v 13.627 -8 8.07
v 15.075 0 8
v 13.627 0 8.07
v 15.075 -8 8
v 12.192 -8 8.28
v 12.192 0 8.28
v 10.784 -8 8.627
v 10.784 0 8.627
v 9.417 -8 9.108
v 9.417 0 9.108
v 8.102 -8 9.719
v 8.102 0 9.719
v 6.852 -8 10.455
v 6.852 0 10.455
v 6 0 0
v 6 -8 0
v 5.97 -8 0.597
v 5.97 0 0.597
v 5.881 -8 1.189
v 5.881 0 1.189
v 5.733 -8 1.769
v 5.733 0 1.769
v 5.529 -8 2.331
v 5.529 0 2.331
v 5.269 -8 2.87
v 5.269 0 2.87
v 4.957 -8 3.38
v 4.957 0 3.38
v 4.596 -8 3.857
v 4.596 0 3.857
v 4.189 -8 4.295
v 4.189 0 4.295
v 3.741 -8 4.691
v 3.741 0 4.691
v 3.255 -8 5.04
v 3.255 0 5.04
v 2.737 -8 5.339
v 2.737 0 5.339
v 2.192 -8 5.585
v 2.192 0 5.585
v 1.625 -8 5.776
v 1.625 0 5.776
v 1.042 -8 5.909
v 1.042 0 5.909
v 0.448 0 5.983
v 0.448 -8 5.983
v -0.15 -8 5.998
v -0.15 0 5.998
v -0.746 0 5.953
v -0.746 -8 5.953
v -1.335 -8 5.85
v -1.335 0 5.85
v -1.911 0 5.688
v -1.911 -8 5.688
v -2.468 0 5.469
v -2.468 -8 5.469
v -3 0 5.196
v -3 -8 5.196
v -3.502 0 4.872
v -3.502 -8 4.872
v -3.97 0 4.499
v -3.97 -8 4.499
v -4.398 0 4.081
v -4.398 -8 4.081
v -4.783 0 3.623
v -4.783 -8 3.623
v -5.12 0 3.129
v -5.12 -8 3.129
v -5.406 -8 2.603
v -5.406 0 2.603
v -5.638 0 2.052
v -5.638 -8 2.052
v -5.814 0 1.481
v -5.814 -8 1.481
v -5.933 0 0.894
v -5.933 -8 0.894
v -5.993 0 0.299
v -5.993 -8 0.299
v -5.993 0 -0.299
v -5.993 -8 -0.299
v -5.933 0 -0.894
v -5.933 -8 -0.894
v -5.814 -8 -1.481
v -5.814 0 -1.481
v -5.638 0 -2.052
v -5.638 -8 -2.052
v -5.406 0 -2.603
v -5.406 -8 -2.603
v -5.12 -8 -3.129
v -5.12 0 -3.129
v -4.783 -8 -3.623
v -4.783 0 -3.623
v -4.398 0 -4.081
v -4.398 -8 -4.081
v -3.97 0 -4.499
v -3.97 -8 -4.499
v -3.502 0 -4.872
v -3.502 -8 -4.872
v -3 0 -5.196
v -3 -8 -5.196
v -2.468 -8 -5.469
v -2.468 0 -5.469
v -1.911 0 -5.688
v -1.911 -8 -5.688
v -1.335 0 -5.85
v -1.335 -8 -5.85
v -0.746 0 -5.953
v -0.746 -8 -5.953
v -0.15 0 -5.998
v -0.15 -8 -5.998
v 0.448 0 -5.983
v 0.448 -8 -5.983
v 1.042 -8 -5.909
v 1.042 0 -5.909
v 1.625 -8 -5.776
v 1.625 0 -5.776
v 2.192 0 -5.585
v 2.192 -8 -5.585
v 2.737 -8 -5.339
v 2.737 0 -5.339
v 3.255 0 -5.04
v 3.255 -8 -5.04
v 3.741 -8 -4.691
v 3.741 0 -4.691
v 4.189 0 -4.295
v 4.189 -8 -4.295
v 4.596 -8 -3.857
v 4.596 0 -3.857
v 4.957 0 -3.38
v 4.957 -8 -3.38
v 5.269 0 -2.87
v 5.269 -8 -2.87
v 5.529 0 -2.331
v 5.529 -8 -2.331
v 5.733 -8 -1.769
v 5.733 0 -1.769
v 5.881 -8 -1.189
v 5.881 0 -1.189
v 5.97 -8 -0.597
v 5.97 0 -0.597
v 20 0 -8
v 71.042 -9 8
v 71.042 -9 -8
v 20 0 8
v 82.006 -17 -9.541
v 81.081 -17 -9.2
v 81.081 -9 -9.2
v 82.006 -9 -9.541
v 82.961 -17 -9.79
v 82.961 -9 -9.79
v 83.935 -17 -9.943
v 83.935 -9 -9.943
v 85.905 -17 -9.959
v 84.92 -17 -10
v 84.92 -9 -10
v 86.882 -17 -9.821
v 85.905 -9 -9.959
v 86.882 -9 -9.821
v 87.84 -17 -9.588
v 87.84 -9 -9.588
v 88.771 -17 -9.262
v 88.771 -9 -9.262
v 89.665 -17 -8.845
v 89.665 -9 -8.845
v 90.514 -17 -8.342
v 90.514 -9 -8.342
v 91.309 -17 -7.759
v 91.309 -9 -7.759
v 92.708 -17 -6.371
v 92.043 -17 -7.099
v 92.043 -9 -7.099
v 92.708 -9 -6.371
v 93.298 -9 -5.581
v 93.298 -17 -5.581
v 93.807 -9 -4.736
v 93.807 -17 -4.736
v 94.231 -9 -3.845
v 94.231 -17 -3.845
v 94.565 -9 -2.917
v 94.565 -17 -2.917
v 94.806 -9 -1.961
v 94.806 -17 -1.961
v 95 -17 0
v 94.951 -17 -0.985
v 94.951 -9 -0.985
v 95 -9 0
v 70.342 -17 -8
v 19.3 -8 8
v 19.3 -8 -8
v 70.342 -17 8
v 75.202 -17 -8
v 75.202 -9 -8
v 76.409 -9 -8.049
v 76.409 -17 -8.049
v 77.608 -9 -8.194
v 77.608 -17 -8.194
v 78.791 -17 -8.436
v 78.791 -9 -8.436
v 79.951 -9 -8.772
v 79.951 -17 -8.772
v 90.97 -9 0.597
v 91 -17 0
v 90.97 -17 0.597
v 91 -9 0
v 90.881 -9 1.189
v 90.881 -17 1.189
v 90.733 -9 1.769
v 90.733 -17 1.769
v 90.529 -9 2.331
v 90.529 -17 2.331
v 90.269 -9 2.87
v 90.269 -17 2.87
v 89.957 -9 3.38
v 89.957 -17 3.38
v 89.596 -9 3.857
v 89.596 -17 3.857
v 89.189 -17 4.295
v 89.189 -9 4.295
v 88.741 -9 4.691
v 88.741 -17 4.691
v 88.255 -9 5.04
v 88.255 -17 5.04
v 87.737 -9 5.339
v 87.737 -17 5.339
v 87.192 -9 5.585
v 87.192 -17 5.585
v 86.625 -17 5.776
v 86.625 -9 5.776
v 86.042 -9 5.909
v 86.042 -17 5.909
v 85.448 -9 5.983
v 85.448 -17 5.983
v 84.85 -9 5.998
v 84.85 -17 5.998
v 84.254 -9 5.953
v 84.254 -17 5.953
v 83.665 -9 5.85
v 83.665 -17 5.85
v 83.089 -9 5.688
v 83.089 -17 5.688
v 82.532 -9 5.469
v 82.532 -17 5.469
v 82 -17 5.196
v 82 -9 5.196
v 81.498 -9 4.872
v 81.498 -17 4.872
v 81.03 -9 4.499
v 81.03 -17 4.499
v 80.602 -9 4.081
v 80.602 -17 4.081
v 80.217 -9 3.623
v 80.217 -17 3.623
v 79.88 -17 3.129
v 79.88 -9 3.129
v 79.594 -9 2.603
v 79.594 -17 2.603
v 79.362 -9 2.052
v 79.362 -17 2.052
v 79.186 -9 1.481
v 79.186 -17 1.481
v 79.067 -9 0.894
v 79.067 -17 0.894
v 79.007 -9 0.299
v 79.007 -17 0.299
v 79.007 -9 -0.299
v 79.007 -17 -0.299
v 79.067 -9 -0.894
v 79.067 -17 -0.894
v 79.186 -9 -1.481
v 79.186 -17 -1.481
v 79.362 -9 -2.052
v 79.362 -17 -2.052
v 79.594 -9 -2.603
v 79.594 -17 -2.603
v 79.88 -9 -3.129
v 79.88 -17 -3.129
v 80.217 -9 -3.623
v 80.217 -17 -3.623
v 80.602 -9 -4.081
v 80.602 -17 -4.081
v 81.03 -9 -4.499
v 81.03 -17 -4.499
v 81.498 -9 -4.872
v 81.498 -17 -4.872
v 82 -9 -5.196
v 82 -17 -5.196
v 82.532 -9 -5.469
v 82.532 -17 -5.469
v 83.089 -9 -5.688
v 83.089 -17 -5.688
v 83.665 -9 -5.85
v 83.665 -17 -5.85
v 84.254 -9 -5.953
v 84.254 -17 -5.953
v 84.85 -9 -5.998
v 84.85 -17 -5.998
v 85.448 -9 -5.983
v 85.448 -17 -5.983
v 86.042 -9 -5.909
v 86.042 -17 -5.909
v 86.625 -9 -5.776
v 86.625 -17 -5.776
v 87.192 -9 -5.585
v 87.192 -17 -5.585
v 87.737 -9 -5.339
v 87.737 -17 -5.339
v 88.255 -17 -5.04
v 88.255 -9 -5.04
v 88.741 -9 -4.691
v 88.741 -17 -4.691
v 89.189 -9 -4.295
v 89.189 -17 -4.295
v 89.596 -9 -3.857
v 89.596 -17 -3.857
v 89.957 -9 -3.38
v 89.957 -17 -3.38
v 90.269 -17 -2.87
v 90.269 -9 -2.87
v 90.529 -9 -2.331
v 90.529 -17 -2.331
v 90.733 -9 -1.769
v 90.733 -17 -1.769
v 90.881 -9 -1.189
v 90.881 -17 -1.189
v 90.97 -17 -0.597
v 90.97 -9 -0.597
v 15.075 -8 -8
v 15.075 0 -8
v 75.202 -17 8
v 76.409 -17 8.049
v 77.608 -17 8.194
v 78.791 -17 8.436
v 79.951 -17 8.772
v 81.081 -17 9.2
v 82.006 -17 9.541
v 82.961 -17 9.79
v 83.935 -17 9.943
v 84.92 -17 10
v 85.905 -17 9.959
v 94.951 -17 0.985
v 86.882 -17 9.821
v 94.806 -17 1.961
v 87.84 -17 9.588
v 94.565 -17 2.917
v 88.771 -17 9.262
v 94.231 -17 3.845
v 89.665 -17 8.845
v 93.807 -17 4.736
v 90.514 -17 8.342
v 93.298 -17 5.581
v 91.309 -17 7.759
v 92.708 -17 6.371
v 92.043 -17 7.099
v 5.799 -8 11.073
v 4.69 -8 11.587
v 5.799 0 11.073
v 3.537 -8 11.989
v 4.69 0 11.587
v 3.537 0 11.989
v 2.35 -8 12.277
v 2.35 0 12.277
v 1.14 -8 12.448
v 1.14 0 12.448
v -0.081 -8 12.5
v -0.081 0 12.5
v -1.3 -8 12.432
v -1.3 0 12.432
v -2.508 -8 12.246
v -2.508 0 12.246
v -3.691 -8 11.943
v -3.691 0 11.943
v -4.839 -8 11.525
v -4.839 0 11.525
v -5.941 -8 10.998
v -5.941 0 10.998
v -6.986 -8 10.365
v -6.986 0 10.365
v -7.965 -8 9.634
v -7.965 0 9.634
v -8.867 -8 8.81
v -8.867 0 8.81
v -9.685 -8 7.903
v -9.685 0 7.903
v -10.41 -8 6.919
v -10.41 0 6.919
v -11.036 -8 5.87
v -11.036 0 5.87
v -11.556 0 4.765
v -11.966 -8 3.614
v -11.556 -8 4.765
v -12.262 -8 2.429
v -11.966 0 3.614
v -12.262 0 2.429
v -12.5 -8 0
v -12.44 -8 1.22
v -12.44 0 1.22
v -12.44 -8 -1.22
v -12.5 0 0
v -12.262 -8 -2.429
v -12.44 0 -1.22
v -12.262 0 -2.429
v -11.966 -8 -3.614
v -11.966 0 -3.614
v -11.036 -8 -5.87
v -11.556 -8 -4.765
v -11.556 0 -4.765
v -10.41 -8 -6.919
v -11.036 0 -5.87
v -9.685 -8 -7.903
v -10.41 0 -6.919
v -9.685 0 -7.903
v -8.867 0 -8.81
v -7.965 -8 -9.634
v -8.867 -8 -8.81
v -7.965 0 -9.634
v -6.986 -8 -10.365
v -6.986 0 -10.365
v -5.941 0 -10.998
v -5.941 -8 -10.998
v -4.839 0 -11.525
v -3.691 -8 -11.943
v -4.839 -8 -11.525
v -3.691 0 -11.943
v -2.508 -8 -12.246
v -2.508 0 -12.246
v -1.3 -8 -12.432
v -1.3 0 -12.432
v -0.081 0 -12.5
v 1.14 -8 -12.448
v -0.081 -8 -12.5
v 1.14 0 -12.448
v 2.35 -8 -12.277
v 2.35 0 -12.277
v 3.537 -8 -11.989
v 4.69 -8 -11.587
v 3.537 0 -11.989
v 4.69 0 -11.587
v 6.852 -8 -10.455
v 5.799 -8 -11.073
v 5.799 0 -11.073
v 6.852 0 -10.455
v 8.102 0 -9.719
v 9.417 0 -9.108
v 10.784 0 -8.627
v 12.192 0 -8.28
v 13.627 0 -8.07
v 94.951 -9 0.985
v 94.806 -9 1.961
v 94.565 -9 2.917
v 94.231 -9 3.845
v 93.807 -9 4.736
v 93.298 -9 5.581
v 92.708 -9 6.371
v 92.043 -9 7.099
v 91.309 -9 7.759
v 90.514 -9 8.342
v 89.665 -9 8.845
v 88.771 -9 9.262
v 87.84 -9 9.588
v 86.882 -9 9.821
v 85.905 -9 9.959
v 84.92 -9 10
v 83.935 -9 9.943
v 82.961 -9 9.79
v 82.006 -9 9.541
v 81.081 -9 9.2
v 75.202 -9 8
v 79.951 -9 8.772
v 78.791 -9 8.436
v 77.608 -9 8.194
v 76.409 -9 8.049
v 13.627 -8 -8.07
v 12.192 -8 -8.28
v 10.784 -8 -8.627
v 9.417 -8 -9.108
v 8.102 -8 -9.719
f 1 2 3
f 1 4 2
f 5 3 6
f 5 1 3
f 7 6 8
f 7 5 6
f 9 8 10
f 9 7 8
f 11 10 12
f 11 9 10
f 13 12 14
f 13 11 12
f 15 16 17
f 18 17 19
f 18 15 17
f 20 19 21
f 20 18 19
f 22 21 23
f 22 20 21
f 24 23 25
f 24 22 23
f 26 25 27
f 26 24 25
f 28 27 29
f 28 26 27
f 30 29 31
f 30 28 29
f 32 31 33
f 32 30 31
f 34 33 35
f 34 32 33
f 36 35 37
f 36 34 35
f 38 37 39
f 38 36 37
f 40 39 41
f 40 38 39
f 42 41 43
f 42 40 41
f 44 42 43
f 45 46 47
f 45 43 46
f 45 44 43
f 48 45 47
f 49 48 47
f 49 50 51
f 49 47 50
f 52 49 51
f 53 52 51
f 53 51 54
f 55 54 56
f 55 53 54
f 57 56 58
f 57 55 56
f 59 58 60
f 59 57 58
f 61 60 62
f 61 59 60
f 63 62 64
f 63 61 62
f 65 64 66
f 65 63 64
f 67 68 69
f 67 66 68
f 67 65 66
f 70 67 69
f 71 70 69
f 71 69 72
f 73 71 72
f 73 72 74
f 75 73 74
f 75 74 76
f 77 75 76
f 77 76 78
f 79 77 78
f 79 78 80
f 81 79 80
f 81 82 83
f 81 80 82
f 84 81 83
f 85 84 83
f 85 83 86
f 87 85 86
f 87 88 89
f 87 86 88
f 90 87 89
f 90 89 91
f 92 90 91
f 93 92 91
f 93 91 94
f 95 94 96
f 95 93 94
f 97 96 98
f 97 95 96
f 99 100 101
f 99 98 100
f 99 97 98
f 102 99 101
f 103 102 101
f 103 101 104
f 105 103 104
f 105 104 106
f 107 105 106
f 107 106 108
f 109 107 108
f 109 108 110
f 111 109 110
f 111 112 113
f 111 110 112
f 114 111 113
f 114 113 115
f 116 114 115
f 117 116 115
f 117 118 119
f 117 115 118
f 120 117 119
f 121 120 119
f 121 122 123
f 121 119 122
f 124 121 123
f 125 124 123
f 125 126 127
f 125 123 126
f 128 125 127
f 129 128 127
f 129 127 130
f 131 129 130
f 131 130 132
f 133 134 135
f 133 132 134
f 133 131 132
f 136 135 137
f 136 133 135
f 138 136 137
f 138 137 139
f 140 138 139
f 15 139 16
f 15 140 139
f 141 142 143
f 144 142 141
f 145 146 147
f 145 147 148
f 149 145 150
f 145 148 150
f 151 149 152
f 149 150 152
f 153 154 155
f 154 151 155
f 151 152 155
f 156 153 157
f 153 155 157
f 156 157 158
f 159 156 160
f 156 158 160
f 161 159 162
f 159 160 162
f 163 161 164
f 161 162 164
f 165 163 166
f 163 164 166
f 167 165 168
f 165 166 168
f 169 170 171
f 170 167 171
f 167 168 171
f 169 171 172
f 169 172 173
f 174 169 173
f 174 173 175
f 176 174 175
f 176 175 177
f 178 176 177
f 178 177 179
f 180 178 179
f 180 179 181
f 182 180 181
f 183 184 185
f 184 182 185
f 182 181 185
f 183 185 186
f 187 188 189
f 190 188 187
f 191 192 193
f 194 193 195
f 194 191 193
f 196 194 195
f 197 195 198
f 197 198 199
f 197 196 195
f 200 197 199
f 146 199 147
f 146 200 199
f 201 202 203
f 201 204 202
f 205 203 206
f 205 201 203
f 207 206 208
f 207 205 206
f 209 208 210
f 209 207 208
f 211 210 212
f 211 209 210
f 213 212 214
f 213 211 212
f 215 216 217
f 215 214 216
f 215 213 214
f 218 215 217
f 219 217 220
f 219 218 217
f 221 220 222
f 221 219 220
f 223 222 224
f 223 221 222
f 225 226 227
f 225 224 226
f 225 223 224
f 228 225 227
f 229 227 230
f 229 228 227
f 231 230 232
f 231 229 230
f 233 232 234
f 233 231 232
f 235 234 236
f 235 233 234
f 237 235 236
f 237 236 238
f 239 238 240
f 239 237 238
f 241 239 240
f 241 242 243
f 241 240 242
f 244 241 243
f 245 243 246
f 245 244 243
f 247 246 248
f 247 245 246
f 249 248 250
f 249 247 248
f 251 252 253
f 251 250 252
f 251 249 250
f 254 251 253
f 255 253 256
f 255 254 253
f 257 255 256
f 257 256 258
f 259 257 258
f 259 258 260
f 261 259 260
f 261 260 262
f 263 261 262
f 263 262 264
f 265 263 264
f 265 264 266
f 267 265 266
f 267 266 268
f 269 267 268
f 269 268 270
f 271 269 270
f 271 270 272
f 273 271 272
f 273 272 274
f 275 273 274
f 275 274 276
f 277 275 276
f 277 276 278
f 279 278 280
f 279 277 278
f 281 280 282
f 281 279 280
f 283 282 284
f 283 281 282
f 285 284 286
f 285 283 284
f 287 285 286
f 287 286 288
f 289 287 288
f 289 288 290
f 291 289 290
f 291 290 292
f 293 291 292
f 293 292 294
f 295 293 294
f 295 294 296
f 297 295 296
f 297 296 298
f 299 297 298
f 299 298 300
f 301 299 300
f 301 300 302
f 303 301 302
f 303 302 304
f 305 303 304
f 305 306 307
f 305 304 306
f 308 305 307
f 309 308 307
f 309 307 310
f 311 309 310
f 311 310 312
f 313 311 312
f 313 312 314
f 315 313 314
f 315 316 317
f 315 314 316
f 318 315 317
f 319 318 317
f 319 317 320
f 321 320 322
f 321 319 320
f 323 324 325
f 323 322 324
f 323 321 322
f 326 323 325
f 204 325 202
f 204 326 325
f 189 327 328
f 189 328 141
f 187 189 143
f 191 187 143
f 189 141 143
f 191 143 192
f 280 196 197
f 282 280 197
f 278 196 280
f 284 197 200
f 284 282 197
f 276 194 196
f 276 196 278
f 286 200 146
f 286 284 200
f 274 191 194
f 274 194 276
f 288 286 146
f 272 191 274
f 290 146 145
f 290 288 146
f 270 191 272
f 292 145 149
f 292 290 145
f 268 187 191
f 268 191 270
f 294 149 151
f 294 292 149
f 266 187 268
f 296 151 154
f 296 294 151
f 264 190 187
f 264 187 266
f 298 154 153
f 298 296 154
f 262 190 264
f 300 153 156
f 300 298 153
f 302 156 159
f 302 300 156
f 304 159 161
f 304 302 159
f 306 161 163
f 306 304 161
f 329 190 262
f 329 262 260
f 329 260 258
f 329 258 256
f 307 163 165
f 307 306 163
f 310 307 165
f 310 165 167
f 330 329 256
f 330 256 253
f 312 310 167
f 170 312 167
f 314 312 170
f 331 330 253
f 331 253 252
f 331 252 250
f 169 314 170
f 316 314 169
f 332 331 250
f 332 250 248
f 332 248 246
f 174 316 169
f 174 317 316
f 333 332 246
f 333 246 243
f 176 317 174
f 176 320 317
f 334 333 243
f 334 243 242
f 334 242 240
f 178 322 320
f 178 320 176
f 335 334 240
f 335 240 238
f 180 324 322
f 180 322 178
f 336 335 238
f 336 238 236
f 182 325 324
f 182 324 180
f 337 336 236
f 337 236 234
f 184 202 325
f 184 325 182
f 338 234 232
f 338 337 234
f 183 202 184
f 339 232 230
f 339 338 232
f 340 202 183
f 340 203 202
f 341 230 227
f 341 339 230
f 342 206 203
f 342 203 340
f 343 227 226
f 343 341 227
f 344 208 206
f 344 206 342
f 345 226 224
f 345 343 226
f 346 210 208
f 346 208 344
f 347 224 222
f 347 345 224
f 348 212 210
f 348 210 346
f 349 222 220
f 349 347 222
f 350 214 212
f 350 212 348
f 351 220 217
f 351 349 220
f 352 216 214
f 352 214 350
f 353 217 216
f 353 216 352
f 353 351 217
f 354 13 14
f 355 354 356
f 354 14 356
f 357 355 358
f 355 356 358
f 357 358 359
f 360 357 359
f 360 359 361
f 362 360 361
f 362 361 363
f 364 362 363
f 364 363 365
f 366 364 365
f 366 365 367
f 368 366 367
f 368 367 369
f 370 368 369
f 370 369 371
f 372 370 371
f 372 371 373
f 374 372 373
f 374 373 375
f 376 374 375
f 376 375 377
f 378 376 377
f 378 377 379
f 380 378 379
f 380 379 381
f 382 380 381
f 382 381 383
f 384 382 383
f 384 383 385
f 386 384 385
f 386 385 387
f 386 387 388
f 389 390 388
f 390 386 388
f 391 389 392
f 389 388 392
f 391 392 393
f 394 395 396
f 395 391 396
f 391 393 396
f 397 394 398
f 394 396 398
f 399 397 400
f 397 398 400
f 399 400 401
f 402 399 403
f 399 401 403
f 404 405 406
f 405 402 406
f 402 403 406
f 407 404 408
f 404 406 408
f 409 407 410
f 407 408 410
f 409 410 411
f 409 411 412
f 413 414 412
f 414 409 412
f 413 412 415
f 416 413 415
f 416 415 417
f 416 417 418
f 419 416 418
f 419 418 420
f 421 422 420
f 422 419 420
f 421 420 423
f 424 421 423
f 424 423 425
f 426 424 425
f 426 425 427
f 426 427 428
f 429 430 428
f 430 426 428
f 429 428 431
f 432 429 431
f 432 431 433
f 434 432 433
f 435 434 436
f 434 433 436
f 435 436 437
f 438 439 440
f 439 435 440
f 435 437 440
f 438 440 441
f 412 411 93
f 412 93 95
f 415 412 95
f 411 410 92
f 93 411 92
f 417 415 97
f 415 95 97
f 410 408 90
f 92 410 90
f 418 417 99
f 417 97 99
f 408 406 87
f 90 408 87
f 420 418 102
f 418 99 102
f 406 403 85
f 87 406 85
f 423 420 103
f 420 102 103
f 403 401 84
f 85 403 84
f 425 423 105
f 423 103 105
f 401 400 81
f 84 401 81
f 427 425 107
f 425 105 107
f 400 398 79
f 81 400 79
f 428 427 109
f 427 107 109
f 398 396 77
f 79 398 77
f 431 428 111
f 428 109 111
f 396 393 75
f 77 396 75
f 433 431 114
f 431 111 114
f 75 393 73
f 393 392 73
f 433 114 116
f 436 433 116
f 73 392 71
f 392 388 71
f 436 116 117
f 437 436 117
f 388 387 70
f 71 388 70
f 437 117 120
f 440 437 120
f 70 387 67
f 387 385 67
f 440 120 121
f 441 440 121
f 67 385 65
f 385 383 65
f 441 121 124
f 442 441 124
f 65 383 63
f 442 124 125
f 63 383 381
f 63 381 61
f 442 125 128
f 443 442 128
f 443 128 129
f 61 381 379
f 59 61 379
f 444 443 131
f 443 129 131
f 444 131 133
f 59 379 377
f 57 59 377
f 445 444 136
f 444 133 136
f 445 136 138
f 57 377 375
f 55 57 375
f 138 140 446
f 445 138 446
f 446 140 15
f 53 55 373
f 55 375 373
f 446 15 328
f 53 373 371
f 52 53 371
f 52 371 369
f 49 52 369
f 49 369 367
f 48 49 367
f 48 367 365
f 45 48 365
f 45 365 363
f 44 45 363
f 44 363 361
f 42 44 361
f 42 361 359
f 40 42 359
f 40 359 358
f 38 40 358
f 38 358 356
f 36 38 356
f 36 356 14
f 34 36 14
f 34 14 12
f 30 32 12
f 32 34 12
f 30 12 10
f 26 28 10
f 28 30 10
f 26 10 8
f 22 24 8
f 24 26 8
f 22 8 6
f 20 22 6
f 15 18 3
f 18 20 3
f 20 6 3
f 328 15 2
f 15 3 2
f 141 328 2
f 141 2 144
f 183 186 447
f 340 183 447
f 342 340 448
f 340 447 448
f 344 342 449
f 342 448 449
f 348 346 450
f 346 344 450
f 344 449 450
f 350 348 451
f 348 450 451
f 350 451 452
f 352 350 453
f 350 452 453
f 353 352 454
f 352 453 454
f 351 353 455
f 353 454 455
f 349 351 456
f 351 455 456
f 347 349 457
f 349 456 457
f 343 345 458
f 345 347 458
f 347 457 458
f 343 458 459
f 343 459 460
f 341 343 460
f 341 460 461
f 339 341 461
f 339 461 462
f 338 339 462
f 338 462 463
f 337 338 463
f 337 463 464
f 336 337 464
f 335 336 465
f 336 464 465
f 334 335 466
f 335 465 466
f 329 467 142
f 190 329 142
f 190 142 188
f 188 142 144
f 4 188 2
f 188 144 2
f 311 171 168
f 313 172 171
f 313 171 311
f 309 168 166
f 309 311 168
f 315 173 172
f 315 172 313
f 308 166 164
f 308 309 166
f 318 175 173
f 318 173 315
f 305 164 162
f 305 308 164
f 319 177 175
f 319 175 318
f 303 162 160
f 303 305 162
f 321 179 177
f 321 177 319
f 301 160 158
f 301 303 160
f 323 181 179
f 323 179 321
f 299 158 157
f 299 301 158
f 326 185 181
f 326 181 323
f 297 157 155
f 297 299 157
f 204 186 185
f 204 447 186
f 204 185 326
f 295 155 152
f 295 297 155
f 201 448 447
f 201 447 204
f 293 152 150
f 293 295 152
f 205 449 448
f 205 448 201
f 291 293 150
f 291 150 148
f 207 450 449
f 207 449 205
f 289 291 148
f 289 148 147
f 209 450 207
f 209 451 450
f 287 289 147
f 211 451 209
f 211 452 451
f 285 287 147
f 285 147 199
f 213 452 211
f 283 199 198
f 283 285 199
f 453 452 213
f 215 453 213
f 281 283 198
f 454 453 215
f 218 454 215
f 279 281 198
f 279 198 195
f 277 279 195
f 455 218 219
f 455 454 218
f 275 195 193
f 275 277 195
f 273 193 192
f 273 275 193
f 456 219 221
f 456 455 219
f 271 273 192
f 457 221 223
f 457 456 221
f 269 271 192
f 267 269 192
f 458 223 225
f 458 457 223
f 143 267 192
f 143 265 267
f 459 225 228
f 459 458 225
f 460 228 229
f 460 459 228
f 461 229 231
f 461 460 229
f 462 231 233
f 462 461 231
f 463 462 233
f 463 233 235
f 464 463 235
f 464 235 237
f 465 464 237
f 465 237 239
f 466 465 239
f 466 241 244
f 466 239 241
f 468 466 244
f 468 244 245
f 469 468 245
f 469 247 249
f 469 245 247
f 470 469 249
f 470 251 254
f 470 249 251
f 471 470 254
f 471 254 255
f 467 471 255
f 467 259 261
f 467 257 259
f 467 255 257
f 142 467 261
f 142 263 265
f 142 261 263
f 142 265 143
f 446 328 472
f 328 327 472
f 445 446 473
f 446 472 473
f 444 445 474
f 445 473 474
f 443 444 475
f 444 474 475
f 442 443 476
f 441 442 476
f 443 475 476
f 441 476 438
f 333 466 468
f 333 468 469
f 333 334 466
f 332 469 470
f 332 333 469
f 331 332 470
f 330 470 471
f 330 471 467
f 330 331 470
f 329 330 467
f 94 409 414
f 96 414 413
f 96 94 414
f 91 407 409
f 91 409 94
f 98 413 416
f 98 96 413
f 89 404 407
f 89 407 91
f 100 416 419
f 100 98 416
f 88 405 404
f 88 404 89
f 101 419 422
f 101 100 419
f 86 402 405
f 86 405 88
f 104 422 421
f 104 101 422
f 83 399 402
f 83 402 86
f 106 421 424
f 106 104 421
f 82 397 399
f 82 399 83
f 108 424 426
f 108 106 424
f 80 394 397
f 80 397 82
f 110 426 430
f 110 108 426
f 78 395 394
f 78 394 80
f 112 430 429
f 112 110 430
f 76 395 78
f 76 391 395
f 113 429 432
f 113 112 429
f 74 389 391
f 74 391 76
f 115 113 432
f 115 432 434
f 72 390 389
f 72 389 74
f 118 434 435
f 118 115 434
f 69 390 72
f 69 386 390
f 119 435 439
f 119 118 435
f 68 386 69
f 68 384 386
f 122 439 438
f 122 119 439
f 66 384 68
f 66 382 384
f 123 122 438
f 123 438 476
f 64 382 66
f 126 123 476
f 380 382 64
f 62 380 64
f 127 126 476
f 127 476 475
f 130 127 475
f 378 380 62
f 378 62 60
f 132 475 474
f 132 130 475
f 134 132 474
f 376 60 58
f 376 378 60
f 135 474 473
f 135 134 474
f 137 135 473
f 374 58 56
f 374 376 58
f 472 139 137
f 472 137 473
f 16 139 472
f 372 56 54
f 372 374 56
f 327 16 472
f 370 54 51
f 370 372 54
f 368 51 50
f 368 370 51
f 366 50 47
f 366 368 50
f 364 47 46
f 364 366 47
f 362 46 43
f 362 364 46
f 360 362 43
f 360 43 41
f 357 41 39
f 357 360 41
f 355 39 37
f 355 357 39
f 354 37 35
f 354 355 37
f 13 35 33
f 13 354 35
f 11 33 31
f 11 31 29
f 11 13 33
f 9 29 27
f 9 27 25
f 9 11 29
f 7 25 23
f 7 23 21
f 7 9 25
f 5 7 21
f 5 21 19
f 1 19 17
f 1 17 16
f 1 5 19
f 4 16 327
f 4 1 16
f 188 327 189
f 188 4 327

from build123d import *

# Parameters (mm, degrees)
F0_R     = 6
F1_DEPTH = 25
F3_DEPTH = 12.7
F4_R     = 15
F5_R     = 15


with BuildPart() as f1:
    # F0 (on Front) → F1 (new body)
    with BuildSketch(Plane.XZ):
        with BuildLine():
            ThreePointArc((9.604686, -8), (11.753905, -4.253905), (12.5, 0))
            ThreePointArc((12.5, 0), (11.753905, 4.253905), (9.604686, 8))
            ThreePointArc((9.604686, 8), (-12.5, 0), (9.604686, -8))
        make_face()
        Circle(F0_R, mode=Mode.SUBTRACT)
        with BuildLine():
            ThreePointArc((9.604686, 8), (11.753905, 4.253905), (12.5, 0))
            ThreePointArc((12.5, 0), (11.753905, -4.253905), (9.604686, -8))
            Line((9.604686, -8), (79, -8))
            ThreePointArc((79, -8), (75, 0), (79, 8))
            Line((79, 8), (9.604686, 8))
        make_face()
        with BuildLine():
            ThreePointArc((95, 0), (89.472136, 8.944272), (79, 8))
            ThreePointArc((79, 8), (75, 0), (79, -8))
            ThreePointArc((79, -8), (89.472136, -8.944272), (95, 0))
        make_face()
        with Locations((85, 0)):
            Circle(F0_R, mode=Mode.SUBTRACT)
    extrude(amount=F1_DEPTH)

    # F2 (on Top) → F3 (intersect, symmetric)
    with BuildSketch(Plane.XY):
        Polygon((20, 0), (0, 0), (-12.5, 0), (-12.5, -8), (0, -8), (19.300091, -8), (70.341627, -17), (95, -17), (95, -9), (71.041536, -9), align=None)
    extrude(amount=F3_DEPTH, both=True, mode=Mode.INTERSECT)

    # F4
    f4_edges = [f1.edges().sort_by_distance(p)[0] for p in [
        (79, -13, 8),
    ]]
    fillet(f4_edges, radius=F4_R)

    # F5
    f5_edges = [f1.edges().sort_by_distance(p)[0] for p in [
        (9.604686, -4, 8),
        (9.604686, -4, -8),
        (79, -13, -8),
    ]]
    fillet(f5_edges, radius=F5_R)


solid = f1.part
